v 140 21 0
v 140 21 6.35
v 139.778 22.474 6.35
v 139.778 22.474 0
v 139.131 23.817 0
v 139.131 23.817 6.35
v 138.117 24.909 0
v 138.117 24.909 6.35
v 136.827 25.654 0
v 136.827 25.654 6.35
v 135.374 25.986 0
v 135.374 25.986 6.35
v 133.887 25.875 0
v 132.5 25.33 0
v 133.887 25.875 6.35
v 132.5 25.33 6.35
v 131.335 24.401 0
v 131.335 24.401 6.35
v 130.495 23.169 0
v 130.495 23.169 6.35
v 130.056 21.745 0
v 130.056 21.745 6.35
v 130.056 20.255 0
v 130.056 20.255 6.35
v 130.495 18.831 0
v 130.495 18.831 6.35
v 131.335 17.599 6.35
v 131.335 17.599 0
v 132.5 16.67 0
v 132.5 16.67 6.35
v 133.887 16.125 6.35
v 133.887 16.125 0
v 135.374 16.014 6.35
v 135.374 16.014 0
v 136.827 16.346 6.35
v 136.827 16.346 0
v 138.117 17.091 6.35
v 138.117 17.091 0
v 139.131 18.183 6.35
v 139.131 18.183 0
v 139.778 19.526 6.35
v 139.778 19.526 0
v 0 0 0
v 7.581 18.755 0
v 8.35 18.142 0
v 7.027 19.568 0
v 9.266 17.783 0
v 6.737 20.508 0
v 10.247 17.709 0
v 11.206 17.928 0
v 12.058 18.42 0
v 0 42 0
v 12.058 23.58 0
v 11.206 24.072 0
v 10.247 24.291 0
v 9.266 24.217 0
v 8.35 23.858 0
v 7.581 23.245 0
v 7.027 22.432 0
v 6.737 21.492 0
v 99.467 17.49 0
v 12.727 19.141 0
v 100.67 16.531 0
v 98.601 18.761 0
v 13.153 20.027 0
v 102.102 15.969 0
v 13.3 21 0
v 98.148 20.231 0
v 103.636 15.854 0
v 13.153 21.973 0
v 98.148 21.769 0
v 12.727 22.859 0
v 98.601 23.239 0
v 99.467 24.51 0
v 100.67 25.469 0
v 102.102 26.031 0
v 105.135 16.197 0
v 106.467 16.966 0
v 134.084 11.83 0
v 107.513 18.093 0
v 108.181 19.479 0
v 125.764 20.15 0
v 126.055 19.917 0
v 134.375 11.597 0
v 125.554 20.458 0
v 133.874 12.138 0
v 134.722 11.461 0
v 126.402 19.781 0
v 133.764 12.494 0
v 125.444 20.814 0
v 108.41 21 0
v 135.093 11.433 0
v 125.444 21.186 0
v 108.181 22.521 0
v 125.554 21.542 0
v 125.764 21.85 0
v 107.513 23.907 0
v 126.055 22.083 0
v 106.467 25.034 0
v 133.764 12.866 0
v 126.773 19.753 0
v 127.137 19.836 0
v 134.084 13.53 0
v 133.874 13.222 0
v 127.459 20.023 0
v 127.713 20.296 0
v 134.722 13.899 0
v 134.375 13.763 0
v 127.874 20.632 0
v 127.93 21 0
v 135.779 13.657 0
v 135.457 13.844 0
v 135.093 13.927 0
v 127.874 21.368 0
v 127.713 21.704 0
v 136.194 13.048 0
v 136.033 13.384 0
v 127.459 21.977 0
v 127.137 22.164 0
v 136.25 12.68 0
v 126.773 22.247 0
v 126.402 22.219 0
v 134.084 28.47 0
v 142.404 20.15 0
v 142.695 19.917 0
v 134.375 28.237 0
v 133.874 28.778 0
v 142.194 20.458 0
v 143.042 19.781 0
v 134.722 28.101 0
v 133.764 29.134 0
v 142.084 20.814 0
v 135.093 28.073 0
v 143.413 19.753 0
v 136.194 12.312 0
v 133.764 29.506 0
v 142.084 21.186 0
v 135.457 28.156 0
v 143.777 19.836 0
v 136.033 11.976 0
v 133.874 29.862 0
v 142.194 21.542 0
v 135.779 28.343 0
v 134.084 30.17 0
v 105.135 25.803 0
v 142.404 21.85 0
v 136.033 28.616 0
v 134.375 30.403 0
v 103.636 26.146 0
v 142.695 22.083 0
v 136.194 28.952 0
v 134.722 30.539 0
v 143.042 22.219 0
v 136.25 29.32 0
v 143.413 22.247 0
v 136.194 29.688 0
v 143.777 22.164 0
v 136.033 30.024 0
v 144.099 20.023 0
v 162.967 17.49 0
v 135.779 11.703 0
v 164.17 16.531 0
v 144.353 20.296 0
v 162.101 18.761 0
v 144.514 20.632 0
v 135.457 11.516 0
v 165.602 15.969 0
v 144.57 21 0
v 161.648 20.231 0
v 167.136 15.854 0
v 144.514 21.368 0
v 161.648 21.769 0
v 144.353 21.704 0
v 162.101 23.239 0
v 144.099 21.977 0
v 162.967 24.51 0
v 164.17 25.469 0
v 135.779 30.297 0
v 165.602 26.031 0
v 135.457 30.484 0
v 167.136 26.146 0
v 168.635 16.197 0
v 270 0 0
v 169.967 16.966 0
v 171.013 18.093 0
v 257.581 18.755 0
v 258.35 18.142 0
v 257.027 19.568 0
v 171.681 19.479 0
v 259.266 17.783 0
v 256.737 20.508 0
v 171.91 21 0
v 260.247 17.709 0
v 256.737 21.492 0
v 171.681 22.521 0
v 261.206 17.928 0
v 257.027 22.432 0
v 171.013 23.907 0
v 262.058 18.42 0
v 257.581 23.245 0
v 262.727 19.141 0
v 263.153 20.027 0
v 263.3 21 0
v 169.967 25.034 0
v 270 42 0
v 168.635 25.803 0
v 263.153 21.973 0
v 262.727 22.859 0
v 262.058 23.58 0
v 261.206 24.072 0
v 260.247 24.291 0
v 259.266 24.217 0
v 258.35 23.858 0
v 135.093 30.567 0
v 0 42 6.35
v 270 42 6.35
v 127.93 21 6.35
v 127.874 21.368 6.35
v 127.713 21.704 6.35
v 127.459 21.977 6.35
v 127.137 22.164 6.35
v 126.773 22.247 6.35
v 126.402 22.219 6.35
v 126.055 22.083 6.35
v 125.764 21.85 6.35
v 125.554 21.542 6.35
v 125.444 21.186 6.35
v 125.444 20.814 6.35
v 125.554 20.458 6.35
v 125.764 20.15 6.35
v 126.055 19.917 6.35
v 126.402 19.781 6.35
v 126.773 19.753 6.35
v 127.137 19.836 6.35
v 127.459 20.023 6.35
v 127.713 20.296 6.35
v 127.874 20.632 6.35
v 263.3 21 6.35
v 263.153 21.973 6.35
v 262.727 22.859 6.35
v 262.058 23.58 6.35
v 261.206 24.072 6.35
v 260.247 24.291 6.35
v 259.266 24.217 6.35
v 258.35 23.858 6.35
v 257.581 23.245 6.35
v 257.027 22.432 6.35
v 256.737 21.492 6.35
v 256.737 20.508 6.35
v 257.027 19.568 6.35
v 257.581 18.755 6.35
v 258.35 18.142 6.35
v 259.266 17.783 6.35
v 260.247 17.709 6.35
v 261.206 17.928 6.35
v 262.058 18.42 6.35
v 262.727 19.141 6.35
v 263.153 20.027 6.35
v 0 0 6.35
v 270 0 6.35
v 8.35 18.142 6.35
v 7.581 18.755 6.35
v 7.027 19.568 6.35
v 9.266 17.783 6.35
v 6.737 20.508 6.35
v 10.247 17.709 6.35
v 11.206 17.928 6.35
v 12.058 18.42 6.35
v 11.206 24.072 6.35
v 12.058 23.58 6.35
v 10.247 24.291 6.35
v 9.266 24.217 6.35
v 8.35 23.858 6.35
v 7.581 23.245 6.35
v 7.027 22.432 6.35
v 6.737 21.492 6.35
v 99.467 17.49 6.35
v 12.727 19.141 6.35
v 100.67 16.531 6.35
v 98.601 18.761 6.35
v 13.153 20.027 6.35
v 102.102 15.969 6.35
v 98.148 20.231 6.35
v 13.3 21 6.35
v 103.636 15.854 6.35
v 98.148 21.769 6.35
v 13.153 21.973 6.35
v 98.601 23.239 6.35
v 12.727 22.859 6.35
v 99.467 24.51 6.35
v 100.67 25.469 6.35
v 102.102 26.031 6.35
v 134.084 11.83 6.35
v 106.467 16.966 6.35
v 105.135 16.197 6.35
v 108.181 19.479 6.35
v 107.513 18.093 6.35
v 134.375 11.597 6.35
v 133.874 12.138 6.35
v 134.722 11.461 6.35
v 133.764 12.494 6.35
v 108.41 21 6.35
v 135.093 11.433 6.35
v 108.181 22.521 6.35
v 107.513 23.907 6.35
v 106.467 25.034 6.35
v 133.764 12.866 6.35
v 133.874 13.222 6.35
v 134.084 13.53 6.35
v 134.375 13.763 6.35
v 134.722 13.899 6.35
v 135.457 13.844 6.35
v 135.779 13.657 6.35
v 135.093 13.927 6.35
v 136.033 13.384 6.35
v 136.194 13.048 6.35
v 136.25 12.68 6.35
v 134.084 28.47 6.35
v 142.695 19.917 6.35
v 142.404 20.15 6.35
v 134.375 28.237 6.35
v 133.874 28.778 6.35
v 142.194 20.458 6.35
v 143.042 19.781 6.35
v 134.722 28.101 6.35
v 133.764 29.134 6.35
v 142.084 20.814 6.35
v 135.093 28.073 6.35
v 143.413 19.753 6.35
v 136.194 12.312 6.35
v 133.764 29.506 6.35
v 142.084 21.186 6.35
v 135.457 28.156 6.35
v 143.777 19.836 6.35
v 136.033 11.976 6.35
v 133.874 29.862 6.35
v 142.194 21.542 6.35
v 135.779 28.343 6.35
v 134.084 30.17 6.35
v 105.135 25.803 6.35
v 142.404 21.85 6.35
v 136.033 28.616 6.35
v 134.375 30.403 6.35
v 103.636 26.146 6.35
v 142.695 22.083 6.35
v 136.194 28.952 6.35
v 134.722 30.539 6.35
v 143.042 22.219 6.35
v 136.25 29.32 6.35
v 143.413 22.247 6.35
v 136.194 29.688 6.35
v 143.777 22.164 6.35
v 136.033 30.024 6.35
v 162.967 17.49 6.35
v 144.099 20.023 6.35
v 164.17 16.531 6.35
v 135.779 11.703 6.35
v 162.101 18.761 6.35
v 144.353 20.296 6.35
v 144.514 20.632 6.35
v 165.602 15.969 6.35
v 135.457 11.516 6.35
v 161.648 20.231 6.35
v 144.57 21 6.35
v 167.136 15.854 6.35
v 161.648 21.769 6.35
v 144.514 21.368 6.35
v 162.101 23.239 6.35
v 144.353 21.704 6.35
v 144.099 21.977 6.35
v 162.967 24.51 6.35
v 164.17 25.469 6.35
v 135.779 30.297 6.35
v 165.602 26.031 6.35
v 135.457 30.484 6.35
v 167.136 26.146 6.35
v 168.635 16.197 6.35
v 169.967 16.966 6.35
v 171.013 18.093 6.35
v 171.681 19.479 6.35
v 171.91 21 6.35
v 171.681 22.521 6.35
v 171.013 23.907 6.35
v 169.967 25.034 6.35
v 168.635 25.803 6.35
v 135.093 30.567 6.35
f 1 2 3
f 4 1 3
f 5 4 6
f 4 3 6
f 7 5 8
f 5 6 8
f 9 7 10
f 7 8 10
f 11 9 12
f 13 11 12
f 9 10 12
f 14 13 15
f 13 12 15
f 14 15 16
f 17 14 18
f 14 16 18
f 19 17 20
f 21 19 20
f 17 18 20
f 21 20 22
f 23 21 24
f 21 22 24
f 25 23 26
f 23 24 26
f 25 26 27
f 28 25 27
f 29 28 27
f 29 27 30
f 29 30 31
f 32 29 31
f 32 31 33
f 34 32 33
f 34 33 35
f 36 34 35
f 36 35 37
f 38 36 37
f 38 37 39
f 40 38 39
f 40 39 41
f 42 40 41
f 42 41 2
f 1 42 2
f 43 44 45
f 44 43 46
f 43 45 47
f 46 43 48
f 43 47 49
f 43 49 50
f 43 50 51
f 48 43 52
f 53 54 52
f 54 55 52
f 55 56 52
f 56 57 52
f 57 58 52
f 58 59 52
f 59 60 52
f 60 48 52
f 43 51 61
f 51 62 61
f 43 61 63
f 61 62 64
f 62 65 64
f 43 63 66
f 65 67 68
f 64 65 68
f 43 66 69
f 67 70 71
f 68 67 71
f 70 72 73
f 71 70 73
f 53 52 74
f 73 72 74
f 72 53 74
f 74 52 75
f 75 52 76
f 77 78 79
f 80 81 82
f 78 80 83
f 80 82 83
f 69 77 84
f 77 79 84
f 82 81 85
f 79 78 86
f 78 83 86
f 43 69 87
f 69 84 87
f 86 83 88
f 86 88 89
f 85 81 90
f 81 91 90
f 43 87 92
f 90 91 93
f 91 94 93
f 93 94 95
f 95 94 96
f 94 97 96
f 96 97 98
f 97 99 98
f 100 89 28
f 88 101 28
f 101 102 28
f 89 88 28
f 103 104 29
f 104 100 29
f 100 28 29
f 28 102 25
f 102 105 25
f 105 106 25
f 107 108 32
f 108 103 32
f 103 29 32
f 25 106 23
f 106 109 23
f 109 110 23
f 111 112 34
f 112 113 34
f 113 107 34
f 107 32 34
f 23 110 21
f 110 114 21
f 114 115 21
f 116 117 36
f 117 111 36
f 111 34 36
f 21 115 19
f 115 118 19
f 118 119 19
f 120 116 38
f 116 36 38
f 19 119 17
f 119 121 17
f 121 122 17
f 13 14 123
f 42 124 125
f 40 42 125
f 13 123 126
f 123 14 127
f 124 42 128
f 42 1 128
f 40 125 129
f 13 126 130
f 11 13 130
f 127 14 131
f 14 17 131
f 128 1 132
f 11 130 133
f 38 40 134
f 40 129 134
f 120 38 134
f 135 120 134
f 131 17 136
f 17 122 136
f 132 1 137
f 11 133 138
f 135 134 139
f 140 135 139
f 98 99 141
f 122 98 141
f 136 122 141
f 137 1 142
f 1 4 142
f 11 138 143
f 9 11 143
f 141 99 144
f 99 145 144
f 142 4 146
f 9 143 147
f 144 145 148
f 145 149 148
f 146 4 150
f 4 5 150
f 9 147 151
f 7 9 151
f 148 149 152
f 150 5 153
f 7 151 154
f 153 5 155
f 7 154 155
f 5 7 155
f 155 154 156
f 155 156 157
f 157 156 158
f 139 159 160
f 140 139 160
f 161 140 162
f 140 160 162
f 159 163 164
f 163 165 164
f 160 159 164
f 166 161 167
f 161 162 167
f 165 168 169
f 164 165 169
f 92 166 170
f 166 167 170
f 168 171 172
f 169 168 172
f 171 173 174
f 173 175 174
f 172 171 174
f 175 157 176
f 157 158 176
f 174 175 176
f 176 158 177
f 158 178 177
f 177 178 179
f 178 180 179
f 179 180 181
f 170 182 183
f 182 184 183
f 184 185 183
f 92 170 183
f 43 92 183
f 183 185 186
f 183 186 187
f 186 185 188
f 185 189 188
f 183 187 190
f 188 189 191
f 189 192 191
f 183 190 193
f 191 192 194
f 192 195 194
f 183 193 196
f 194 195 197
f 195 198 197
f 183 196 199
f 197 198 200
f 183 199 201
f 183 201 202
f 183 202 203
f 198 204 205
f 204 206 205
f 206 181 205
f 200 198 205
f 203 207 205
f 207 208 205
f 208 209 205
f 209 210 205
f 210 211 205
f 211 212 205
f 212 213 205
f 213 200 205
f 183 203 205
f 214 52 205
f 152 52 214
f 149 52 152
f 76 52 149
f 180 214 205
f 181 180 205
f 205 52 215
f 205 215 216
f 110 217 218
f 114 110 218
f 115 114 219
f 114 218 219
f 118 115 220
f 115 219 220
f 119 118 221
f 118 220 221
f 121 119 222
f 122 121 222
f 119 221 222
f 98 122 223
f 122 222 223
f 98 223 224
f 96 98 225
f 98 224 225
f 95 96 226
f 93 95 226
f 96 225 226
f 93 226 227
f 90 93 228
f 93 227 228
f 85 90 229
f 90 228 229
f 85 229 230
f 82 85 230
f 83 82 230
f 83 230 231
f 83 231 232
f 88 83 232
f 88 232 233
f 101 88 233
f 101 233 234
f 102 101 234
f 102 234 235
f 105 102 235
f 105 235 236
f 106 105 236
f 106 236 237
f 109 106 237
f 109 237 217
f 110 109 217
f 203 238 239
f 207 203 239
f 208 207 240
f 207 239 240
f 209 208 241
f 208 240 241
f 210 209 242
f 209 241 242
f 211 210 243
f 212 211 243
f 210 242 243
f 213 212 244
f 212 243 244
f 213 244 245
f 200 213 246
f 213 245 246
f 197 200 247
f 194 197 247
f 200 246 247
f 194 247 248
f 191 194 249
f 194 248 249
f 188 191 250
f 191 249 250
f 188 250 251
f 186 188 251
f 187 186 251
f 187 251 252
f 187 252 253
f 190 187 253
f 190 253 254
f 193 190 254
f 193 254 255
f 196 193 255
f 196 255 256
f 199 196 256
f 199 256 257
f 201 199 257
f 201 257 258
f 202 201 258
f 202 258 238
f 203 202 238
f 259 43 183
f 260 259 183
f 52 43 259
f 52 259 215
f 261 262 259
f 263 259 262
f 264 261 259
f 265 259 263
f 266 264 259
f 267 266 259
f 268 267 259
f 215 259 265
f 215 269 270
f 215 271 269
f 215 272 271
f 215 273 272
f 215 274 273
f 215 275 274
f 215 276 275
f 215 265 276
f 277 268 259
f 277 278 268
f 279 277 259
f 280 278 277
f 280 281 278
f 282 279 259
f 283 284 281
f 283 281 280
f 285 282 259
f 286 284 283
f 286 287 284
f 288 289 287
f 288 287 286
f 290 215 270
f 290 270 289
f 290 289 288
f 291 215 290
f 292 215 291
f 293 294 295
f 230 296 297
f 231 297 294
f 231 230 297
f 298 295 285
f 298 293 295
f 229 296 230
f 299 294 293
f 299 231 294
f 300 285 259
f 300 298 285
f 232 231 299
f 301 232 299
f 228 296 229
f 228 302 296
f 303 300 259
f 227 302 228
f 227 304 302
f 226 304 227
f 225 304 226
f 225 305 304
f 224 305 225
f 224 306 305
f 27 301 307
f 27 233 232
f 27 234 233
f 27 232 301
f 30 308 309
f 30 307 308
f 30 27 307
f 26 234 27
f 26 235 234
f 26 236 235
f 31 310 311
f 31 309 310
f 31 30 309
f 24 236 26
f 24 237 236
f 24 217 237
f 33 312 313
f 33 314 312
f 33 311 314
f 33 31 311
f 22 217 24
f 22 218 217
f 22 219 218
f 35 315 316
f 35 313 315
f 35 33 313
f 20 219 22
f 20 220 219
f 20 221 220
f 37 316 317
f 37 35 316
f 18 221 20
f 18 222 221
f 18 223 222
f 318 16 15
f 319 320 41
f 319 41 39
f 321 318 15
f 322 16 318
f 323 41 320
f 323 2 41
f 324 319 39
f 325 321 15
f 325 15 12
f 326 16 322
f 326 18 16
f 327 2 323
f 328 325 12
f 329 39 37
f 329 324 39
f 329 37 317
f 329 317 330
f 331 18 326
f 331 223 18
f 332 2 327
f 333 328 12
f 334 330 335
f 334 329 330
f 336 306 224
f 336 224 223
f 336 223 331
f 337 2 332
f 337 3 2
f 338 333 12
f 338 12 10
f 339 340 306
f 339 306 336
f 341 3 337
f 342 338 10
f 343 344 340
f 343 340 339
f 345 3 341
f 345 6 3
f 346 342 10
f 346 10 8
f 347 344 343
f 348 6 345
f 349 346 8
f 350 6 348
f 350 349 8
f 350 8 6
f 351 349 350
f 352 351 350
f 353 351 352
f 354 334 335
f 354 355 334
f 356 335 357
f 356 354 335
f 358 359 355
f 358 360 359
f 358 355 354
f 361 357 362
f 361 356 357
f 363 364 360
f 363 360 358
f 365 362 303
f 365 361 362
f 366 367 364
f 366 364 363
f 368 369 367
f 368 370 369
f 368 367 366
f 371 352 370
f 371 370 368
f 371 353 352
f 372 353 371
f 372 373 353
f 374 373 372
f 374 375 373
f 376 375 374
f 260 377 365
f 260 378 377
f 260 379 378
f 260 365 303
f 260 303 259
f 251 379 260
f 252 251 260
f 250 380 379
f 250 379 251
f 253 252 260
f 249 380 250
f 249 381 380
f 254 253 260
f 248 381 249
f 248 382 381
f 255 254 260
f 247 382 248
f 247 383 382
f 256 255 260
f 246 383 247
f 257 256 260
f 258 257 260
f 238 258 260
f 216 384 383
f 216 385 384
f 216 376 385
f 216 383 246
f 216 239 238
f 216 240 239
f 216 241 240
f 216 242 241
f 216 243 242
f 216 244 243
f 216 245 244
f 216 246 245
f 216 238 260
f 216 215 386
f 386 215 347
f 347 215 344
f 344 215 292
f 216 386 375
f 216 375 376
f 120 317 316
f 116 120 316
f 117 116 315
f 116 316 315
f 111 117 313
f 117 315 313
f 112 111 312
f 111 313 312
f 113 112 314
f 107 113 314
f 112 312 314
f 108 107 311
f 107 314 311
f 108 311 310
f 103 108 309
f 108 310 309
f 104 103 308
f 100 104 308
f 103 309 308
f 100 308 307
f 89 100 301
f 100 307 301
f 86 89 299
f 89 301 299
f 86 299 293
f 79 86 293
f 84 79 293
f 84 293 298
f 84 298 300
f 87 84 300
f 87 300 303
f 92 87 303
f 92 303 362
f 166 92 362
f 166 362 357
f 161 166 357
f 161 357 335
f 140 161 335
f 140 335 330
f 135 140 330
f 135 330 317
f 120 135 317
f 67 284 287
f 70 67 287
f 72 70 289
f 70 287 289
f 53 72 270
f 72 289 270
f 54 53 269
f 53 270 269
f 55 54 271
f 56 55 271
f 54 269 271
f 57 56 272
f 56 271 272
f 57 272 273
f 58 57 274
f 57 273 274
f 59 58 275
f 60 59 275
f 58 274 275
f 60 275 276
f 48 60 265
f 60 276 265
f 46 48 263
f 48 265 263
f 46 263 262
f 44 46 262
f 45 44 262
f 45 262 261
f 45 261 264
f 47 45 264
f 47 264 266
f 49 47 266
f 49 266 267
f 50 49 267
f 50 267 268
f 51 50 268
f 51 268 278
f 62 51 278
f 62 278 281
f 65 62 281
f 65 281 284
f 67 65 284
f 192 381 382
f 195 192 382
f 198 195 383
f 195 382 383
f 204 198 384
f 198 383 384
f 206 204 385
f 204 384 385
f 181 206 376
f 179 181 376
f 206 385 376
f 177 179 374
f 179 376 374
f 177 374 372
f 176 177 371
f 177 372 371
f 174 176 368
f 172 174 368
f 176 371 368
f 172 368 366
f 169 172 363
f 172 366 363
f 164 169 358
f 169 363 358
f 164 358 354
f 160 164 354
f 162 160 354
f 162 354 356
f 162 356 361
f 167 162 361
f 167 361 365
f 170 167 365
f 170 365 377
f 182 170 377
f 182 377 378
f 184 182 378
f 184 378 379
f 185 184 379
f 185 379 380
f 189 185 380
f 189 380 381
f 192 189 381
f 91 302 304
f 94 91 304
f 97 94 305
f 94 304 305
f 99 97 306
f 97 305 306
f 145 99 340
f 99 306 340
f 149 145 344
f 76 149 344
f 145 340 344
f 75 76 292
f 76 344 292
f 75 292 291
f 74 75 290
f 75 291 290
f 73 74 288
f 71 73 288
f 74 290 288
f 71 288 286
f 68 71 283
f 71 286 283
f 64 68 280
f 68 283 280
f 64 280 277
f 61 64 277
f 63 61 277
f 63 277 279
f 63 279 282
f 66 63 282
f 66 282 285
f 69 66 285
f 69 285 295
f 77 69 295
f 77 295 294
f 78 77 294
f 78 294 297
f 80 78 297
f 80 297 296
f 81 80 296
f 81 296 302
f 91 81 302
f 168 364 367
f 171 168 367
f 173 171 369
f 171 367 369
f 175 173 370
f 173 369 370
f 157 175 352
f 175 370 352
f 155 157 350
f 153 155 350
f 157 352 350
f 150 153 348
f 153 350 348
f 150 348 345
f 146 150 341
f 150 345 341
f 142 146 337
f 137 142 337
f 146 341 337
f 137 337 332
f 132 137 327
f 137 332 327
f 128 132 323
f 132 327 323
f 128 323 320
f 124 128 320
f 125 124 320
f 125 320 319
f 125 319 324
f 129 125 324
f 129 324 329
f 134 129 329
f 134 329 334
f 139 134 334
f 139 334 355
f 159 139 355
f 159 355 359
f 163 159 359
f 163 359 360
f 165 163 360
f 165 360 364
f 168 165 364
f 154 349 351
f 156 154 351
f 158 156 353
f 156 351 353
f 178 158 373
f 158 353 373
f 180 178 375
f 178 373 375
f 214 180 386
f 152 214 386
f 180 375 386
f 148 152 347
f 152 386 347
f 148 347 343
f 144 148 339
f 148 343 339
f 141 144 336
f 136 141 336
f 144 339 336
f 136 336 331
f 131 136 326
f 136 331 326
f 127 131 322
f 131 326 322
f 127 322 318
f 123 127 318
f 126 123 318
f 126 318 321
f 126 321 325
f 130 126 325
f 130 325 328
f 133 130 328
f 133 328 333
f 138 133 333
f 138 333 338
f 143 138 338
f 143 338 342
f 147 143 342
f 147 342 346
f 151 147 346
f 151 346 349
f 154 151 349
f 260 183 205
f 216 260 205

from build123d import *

# Parameters (mm, degrees)
F0_W     = 270
F0_H     = 42
F1_DEPTH = 6.35
F2_R     = 5
F3_DEPTH = 6.351
F4_R     = 3.3
F5_DEPTH = 6.351
F6_R     = 5.16
F7_DEPTH = 6.351
F8_R     = 1.25
F9_DEPTH = 6.351


with BuildPart() as f1:
    # F0 (on Top) → F1 (new body)
    with BuildSketch(Plane.XY):
        with Locations((135, 21)):
            Rectangle(F0_W, F0_H)
    extrude(amount=F1_DEPTH)

    # F2 (on face) → F3 (cut, through all)
    with BuildSketch(Plane.XY.offset(6.35)):
        with Locations((135, 21)):
            Circle(F2_R)
    extrude(amount=-F3_DEPTH, mode=Mode.SUBTRACT)

    # F4 (on face) → F5 (cut, through all)
    with BuildSketch(Plane.XY.offset(6.35)):
        with Locations((10, 21)):
            Circle(F4_R)
        with Locations((260, 21)):
            Circle(F4_R)
    extrude(amount=-F5_DEPTH, mode=Mode.SUBTRACT)

    # F6 (on face) → F7 (cut, through all)
    with BuildSketch(Plane.XY.offset(6.35)):
        with Locations((103.25, 21)):
            Circle(F6_R)
        with Locations((166.75, 21)):
            Circle(F6_R)
    extrude(amount=-F7_DEPTH, mode=Mode.SUBTRACT)

    # F8 (on face) → F9 (cut, through all)
    with BuildSketch(Plane.XY.offset(6.35)):
        with Locations((135, 29.32)):
            Circle(F8_R)
        with Locations((126.68, 21)):
            Circle(F8_R)
        with Locations((135, 12.68)):
            Circle(F8_R)
        with Locations((143.32, 21)):
            Circle(F8_R)
    extrude(amount=-F9_DEPTH, mode=Mode.SUBTRACT)


solid = f1.part
